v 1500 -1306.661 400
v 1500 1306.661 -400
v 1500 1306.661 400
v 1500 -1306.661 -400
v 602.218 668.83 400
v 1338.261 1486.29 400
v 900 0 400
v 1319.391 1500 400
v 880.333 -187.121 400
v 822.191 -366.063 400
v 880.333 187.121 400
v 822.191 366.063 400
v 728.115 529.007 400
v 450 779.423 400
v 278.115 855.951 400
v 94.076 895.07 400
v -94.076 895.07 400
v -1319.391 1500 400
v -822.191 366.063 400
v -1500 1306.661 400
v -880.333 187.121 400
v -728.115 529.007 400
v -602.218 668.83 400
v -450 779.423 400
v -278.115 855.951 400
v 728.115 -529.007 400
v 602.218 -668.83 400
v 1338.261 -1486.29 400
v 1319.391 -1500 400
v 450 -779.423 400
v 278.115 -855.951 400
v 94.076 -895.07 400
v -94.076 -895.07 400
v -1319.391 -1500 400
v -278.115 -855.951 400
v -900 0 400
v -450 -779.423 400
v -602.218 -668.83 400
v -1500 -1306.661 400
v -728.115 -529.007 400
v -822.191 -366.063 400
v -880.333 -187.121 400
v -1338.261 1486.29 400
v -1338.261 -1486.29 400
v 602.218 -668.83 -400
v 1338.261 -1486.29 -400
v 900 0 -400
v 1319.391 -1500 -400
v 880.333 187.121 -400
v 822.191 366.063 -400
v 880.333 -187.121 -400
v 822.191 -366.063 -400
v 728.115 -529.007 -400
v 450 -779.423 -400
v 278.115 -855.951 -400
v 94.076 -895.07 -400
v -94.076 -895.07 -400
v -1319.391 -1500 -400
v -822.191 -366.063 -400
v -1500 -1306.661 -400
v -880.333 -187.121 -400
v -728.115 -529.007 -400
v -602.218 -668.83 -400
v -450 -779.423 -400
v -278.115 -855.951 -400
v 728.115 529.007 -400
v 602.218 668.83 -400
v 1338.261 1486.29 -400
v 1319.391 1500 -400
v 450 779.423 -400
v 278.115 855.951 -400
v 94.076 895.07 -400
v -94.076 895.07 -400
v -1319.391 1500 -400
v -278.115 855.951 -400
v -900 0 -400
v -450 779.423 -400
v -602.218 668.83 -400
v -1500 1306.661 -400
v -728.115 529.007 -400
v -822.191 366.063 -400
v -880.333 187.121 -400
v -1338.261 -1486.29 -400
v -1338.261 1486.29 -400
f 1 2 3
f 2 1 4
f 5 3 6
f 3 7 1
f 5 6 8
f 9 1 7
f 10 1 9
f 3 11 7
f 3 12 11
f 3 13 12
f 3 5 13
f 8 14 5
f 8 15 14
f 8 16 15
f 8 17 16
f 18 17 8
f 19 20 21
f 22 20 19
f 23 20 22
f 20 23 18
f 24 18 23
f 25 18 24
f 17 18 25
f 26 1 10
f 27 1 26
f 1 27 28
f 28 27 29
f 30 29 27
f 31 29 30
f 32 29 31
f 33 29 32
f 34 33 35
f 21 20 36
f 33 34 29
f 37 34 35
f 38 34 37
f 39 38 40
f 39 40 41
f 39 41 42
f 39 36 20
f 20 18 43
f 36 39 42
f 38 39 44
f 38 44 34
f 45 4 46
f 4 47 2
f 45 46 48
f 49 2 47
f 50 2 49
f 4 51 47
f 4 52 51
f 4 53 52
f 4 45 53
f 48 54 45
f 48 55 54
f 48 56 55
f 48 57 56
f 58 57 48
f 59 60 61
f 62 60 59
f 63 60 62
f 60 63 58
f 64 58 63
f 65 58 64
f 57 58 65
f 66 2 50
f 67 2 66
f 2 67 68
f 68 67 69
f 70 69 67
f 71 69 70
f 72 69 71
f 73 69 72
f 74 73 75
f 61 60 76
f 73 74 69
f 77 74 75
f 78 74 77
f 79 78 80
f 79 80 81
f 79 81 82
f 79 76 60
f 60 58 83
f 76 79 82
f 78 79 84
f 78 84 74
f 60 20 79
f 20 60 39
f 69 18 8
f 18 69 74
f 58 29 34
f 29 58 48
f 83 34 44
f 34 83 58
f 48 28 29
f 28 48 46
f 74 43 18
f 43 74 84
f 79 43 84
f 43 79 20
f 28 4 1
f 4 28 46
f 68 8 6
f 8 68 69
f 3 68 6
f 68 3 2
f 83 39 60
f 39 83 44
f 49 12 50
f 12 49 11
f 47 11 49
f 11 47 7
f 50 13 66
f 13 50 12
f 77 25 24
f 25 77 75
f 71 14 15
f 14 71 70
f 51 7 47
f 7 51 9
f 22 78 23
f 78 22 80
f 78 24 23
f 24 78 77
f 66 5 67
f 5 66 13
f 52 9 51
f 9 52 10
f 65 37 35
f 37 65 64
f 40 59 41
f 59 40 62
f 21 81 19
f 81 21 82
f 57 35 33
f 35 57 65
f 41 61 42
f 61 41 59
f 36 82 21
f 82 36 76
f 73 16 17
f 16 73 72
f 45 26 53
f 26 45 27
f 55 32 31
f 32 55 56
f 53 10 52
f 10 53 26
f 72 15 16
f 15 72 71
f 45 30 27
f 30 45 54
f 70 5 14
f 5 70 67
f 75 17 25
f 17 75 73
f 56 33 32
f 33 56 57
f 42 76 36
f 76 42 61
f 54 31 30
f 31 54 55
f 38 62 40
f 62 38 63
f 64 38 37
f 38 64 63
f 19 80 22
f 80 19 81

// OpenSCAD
module BallNutSquare(r=600, h=800) {
  difference() {
    intersection() {
      cube([3000, 3000, h], center=true);
      cylinder(h, 2000, 2000, center=true);
    }
    cylinder(h + 1, r + 300, r + 300, center=true);
  }
}

module BallNutRound(r=800, h=1000) {
  difference() {
    intersection() {
      cylinder(r=2400, h=h, center=true);
      cube([3950, 5000, h], center=true);
    }
    cylinder(h + 1, r + 350, r + 350, center=true);
  }
}

BallNutSquare();
